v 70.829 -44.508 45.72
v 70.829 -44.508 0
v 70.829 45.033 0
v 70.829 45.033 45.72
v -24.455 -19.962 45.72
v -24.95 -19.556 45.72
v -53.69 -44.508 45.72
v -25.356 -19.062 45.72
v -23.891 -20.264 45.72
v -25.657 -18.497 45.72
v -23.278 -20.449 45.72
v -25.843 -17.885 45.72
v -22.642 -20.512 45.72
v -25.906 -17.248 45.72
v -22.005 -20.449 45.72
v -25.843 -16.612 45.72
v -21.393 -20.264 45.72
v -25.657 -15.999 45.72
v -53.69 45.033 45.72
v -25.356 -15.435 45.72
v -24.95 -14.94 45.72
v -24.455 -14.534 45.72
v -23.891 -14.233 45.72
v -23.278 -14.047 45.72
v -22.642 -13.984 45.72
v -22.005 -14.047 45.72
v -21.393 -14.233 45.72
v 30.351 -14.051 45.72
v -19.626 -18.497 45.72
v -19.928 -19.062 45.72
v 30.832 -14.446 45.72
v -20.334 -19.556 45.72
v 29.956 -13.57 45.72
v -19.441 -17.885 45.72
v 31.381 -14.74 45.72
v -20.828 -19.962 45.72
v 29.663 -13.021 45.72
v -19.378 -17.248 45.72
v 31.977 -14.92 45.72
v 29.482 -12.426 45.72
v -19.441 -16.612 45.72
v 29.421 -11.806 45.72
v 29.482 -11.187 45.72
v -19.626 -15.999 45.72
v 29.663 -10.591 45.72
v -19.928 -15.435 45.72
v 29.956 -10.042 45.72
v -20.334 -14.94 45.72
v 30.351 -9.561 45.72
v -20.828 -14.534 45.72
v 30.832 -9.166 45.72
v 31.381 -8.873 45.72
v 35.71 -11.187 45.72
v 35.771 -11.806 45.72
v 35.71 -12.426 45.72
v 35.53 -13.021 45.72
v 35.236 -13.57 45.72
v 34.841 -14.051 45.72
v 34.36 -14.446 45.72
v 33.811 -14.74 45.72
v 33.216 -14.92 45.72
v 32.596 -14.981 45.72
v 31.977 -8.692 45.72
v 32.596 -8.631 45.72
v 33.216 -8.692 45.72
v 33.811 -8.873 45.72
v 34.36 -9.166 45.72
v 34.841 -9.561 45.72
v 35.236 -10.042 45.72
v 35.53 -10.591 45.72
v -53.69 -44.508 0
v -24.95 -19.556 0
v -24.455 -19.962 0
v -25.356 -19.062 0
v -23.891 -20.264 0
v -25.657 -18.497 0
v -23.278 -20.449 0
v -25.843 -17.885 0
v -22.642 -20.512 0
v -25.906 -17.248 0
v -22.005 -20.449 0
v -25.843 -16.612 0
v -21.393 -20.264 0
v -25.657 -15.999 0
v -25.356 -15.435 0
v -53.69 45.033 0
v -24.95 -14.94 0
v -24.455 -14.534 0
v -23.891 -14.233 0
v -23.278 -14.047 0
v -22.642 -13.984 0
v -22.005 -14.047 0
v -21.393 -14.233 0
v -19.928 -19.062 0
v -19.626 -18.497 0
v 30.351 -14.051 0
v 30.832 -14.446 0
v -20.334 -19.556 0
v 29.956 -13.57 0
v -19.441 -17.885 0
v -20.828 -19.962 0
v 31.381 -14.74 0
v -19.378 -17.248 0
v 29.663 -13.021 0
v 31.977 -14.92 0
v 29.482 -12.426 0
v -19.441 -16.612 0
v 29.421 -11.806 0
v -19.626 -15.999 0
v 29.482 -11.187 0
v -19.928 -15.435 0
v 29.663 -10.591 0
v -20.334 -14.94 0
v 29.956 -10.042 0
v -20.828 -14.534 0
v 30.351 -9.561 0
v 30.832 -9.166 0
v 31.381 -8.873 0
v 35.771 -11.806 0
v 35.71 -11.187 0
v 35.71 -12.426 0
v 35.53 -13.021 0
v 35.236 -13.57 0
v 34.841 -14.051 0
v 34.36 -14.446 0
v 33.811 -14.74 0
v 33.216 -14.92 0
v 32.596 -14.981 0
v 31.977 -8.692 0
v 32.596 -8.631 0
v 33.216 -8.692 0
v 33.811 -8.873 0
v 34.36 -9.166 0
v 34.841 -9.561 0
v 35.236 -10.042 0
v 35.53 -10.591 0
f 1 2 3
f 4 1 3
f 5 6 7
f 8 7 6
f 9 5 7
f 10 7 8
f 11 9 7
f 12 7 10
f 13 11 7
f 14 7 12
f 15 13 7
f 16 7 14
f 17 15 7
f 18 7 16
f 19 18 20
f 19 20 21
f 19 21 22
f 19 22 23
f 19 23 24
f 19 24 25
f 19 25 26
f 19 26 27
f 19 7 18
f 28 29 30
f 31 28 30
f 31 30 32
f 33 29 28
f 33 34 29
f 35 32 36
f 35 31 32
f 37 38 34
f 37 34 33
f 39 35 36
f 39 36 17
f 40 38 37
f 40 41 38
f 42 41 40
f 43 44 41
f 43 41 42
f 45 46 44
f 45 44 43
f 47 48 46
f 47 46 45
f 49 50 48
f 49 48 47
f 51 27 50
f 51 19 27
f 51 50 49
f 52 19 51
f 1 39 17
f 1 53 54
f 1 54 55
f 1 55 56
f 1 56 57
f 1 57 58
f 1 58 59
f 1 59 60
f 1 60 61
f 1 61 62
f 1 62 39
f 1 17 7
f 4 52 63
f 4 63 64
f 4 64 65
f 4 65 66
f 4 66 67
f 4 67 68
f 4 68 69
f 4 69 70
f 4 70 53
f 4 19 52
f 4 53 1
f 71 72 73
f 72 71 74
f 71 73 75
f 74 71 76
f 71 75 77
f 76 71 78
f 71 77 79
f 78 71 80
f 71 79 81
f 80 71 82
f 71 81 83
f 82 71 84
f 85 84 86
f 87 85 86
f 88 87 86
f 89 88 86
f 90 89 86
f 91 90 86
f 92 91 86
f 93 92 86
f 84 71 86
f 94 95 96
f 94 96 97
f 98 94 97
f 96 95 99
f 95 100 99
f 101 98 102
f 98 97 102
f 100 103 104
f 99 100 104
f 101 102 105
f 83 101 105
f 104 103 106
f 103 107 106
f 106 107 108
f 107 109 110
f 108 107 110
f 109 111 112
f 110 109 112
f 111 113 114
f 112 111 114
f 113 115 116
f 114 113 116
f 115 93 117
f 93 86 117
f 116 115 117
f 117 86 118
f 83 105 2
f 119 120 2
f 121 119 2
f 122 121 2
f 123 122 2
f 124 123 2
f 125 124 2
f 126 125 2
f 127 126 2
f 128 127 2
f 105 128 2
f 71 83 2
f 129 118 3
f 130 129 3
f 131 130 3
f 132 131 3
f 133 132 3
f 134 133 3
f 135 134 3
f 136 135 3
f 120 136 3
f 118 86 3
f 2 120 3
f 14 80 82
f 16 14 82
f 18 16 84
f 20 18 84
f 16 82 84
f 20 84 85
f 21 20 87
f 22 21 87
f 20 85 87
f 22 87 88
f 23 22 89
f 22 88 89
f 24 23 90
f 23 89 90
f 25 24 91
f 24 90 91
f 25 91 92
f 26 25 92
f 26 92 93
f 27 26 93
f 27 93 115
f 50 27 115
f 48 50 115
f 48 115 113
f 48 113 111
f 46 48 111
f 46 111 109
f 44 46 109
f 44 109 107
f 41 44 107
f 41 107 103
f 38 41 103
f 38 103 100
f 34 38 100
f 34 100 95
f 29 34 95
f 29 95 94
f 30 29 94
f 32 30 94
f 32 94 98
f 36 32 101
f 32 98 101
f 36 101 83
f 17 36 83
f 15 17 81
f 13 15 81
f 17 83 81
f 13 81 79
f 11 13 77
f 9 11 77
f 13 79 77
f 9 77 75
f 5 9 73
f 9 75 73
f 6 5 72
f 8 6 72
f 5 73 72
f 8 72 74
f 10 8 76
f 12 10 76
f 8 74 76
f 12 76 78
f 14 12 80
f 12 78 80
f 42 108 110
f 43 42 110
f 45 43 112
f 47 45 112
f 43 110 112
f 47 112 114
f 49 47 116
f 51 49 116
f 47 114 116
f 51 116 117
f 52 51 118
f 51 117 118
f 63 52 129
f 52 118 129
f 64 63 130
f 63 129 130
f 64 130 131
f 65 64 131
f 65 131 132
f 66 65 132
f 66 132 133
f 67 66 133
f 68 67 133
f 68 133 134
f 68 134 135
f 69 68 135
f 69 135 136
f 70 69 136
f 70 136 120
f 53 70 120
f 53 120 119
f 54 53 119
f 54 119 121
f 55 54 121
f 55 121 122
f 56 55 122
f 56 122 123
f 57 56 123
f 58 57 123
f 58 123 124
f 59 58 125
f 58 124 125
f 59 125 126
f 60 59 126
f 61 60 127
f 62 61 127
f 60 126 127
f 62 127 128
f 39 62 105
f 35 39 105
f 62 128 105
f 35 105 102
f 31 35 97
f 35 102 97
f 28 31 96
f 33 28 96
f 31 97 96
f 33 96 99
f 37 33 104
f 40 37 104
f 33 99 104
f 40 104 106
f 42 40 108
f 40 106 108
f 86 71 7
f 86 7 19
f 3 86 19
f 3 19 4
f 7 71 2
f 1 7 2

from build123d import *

# Parameters (mm, degrees)
F0_W     = 124.5182976127
F0_H     = 89.5412452519
F1_DEPTH = 45.72
F3_D     = 6.5278
F5_D     = 6.35


with BuildPart() as f1:
    # F0 (on Top) → F1 (new body)
    with BuildSketch(Plane.XY):
        with Locations((8.5693784058, 0.2623293549)):
            Rectangle(F0_W, F0_H)
    extrude(amount=F1_DEPTH)

    # F3 (through all)
    with Locations(Plane.XY.offset(45.72)):
        with Locations((-22.6416923106, -17.2483026981)):
            Hole(F3_D / 2)

    # F5 (through all)
    with Locations(Plane.XY.offset(45.72)):
        with Locations((32.5962975621, -11.8062160909)):
            Hole(F5_D / 2)


solid = f1.part
